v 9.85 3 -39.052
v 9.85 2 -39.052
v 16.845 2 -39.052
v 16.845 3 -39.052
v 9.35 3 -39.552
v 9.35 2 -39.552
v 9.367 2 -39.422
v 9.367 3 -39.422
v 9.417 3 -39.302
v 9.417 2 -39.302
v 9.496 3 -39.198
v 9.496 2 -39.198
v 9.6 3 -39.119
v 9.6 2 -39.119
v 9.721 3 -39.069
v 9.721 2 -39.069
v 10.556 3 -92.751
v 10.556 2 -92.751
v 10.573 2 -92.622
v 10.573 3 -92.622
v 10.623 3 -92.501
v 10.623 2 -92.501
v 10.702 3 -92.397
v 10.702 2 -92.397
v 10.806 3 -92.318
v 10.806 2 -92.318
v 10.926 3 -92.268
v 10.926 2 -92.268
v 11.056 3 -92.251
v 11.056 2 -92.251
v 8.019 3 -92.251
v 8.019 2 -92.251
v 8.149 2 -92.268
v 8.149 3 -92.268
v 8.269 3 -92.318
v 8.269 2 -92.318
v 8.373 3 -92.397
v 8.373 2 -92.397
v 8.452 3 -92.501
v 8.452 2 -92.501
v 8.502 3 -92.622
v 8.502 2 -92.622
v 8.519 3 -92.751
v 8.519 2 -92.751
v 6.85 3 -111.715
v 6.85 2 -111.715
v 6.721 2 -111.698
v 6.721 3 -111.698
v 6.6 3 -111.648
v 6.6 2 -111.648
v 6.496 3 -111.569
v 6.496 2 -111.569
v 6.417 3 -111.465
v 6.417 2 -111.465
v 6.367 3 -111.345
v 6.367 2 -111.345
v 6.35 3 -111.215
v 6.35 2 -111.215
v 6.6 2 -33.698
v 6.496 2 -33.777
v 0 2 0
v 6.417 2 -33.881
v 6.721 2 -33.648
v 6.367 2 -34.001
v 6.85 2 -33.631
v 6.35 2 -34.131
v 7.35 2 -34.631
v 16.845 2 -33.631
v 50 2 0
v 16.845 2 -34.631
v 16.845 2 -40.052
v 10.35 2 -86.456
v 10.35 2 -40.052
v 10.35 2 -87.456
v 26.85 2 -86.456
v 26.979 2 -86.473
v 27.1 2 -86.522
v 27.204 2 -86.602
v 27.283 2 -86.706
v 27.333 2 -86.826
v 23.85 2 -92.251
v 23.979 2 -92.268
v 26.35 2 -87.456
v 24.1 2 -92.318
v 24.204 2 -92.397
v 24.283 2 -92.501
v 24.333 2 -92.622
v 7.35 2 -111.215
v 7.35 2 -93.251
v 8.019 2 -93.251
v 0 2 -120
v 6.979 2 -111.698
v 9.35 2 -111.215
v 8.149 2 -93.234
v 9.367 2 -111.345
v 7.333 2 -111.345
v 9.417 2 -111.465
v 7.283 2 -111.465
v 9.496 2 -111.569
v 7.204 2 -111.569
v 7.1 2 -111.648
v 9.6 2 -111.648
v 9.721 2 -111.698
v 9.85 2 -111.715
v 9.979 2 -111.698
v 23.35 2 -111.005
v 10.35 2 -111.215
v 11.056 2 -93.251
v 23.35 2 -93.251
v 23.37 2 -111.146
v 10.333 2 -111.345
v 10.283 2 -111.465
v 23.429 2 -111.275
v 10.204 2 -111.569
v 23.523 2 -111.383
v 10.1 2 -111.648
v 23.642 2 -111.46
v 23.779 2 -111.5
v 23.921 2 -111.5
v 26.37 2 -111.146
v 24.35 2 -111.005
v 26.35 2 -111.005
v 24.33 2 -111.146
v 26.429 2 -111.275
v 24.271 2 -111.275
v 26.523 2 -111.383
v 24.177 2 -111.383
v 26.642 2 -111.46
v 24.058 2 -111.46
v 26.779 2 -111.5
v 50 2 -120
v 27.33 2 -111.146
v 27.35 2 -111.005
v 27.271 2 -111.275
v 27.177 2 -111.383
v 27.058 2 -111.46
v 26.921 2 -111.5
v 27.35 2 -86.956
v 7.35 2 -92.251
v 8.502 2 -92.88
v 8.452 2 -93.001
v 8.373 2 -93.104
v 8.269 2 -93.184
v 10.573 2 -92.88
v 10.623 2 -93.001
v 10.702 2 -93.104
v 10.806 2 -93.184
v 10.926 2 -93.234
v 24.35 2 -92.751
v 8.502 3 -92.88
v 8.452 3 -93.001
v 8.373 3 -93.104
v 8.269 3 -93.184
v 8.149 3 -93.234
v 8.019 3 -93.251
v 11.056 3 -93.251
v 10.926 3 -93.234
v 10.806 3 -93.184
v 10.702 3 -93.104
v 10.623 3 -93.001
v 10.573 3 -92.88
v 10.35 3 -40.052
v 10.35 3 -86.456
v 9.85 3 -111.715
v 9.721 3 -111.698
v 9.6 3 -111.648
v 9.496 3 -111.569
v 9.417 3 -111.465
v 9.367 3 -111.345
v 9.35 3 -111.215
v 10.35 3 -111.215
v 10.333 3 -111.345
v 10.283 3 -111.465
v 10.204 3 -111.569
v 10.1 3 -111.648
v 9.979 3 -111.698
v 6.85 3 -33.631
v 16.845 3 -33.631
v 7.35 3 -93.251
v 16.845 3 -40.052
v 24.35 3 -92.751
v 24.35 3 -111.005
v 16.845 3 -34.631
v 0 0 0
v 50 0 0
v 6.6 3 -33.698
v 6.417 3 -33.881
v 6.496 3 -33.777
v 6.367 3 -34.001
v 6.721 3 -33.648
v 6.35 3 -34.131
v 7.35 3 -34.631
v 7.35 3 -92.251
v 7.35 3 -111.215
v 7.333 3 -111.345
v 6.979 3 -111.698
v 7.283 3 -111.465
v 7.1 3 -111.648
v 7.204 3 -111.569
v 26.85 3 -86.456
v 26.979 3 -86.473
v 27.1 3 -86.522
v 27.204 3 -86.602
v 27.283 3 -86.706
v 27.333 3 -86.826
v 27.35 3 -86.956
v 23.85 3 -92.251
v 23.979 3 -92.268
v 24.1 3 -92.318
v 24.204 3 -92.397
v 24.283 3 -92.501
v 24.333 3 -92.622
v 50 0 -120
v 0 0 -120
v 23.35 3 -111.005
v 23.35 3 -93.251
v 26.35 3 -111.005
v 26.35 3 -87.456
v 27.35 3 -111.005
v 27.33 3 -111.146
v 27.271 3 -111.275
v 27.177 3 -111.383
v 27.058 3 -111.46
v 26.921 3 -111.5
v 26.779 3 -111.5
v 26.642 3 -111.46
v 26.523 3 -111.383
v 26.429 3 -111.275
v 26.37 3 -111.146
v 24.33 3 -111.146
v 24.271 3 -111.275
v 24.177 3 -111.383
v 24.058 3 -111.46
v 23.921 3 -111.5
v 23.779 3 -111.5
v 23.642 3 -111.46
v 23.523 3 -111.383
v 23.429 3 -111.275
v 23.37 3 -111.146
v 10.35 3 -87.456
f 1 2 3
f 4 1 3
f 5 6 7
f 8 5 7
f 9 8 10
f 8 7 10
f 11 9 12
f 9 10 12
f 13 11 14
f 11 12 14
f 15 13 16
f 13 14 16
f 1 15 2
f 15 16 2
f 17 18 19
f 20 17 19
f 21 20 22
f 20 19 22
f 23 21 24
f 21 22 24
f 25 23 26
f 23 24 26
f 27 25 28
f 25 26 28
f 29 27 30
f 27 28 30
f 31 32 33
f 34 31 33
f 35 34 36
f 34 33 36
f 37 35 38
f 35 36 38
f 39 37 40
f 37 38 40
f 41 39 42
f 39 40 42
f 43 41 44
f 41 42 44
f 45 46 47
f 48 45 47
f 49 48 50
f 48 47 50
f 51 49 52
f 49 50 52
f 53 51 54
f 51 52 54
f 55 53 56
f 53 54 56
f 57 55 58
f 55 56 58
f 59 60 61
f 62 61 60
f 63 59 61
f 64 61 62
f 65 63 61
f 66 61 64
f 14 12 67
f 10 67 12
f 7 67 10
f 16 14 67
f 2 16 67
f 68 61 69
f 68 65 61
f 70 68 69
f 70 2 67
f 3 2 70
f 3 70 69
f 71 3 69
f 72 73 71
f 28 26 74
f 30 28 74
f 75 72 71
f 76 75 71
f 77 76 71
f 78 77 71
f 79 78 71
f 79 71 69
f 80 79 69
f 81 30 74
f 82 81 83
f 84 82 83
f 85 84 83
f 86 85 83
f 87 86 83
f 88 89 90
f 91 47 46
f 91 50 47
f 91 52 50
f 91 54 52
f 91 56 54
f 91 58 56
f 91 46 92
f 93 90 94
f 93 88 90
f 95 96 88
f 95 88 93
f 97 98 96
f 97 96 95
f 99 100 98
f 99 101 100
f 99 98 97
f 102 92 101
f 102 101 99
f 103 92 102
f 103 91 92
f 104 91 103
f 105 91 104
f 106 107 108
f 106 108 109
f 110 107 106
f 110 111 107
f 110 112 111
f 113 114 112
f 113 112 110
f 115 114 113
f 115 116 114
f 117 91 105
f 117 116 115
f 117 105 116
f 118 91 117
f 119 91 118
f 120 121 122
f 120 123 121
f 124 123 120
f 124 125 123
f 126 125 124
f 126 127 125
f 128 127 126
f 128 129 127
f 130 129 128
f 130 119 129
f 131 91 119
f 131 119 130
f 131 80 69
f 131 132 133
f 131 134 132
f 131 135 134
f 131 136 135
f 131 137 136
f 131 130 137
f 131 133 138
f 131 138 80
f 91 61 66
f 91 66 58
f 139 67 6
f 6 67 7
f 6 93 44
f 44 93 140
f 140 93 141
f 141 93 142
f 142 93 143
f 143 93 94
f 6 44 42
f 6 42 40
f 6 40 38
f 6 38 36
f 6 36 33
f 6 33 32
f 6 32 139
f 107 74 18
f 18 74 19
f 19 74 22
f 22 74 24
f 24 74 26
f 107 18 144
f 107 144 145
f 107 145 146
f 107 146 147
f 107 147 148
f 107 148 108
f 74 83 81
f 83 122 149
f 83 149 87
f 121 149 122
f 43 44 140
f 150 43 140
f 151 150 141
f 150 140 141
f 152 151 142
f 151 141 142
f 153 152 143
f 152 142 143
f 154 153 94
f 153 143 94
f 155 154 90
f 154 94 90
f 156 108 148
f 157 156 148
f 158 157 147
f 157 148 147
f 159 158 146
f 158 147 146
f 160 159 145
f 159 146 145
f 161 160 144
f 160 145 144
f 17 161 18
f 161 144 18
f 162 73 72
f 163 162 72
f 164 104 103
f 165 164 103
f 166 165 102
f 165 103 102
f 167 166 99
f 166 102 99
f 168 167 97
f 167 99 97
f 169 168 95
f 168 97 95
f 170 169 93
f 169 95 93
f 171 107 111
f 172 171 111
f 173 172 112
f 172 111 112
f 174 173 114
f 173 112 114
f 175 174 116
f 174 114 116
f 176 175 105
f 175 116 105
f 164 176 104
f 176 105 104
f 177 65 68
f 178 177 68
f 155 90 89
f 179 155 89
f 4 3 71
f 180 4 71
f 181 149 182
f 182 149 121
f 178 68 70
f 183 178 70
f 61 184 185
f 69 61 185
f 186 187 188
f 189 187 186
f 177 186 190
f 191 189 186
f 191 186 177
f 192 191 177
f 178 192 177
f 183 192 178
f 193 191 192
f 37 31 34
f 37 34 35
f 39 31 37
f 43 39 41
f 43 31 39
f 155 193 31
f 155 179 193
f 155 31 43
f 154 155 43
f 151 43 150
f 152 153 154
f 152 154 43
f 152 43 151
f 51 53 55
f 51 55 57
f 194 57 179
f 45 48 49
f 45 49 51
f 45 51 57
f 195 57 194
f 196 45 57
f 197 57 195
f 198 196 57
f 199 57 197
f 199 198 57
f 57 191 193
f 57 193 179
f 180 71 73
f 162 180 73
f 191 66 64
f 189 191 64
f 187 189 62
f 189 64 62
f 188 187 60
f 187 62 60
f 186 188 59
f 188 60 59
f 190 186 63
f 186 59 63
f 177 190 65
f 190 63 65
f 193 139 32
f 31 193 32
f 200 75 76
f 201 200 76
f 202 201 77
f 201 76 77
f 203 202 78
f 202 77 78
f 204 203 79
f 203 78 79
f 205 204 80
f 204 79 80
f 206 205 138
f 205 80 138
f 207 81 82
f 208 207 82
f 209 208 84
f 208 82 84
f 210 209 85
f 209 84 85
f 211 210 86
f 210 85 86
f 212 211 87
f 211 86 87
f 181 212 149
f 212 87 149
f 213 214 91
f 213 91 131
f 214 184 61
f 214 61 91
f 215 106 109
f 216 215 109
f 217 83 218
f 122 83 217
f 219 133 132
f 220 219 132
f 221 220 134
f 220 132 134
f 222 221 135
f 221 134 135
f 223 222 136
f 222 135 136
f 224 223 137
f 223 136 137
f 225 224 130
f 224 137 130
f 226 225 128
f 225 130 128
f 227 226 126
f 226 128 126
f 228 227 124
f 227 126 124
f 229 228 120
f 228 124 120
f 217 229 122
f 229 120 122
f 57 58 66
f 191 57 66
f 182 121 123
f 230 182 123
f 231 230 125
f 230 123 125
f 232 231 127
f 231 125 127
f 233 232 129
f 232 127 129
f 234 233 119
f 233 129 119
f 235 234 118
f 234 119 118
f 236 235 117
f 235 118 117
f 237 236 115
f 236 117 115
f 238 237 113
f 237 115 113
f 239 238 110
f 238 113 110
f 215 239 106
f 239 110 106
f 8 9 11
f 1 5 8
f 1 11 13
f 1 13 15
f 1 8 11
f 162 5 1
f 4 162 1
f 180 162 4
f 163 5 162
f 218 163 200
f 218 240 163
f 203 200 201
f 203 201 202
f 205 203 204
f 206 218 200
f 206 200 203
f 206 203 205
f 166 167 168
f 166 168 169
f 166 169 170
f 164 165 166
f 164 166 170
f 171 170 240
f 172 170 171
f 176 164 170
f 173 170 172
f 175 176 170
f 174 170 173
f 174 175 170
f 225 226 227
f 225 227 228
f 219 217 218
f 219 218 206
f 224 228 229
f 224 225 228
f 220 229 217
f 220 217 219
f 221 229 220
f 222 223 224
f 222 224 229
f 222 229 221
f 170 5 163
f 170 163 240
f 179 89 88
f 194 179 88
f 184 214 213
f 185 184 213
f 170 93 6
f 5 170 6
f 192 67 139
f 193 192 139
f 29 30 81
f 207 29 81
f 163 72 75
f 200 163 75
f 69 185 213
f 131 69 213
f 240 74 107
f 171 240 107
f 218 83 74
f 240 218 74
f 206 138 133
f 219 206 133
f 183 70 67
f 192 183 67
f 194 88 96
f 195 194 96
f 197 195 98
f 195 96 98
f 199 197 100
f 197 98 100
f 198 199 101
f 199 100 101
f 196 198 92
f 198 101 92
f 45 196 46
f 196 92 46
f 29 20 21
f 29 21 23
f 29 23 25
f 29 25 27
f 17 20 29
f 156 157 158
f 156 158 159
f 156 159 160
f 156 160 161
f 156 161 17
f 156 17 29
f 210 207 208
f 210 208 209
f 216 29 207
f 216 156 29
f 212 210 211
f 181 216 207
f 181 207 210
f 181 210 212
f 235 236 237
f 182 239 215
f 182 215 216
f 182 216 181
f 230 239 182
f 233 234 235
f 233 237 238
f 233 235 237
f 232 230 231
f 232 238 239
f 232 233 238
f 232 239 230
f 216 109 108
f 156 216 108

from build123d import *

# Parameters (mm, degrees)
SKETCH1_W           = 50
SKETCH1_H           = 120
BOSS_EXTRUDE1_DEPTH = 2
SKETCH2_W           = 0.5
SKETCH2_H           = 5.295420769
SKETCH2_H_2         = 23.549654675
BOSS_EXTRUDE3_DEPTH = 1


with BuildPart() as part:
    # Sketch1 → Boss-Extrude1 (new body)
    with BuildSketch(Plane(origin=(0, 0, 0), x_dir=(1, 0, 0), z_dir=(0, 1, 0))):
        with Locations((25, 60)):
            Rectangle(SKETCH1_W, SKETCH1_H)
    extrude(amount=BOSS_EXTRUDE1_DEPTH)

    # Sketch2 → Boss-Extrude3 (add)
    with BuildSketch(Plane(origin=(0, 2, 0), x_dir=(1, 0, 0), z_dir=(0, 1, 0))):
        with BuildLine():
            Line((9.849958258, 39.051579924), (16.845127039, 39.051579924))
            Line((16.845127039, 39.051579924), (16.845127039, 40.051579924))
            Line((16.845127039, 40.051579924), (10.349958258, 40.051579924))
            Line((10.349958258, 40.051579924), (10.349958258, 39.551579924))
            ThreePointArc((10.349958258, 39.551579924), (10.203511648, 39.198026534), (9.849958258, 39.051579924))
        make_face()
        with BuildLine():
            Line((10.349958258, 40.051579924), (10.349958258, 86.455511816))
            Line((10.349958258, 86.455511816), (9.849958258, 86.455511816))
            ThreePointArc((9.849958258, 86.455511816), (9.496404867, 86.601958426), (9.349958258, 86.955511816))
            Line((9.349958258, 86.955511816), (9.349958258, 39.551579924))
            ThreePointArc((9.349958258, 39.551579924), (9.496404867, 39.198026534), (9.849958258, 39.051579924))
            ThreePointArc((9.849958258, 39.051579924), (10.203511648, 39.198026534), (10.349958258, 39.551579924))
            Line((10.349958258, 39.551579924), (10.349958258, 40.051579924))
        make_face()
        with BuildLine():
            Line((6.849958258, 33.630782095), (16.845127039, 33.630782095))
            Line((16.845127039, 33.630782095), (16.845127039, 34.630782095))
            Line((16.845127039, 34.630782095), (7.349958258, 34.630782095))
            Line((7.349958258, 34.630782095), (7.349958258, 92.250932585))
            Line((7.349958258, 92.250932585), (8.019263959, 92.250932585))
            ThreePointArc((8.019263959, 92.250932585), (8.37281735, 92.397379194), (8.519263959, 92.750932585))
            ThreePointArc((8.519263959, 92.750932585), (8.37281735, 93.104485976), (8.019263959, 93.250932585))
            Line((8.019263959, 93.250932585), (7.349958258, 93.250932585))
            Line((7.349958258, 93.250932585), (7.349958258, 111.215314398))
            ThreePointArc((7.349958258, 111.215314398), (7.203511648, 111.568867789), (6.849958258, 111.715314398))
            ThreePointArc((6.849958258, 111.715314398), (6.496404867, 111.568867789), (6.349958258, 111.215314398))
            Line((6.349958258, 111.215314398), (6.349958258, 34.130782095))
            ThreePointArc((6.349958258, 34.130782095), (6.496404867, 33.777228705), (6.849958258, 33.630782095))
        make_face()
        with BuildLine():
            Line((9.849958258, 92.750932585), (10.349958258, 92.750932585))
            Line((10.349958258, 92.750932585), (10.349958258, 111.215314398))
            ThreePointArc((10.349958258, 111.215314398), (10.203511648, 111.568867789), (9.849958258, 111.715314398))
            ThreePointArc((9.849958258, 111.715314398), (9.496404867, 111.568867789), (9.349958258, 111.215314398))
            Line((9.349958258, 111.215314398), (9.349958258, 92.750932585))
            Line((9.349958258, 92.750932585), (9.849958258, 92.750932585))
        make_face()
        with Locations((10.099958258, 90.1032222)):
            Rectangle(SKETCH2_W, SKETCH2_H)
        with BuildLine():
            ThreePointArc((9.349958258, 86.955511816), (9.496404867, 87.309065207), (9.849958258, 87.455511816))
            Line((9.849958258, 87.455511816), (9.849958258, 92.750932585))
            Line((9.849958258, 92.750932585), (9.349958258, 92.750932585))
            Line((9.349958258, 92.750932585), (9.349958258, 86.955511816))
        make_face()
        with BuildLine():
            ThreePointArc((11.055620389, 93.250932585), (10.702066998, 93.104485976), (10.555620389, 92.750932585))
            Line((10.555620389, 92.750932585), (23.349958258, 92.750932585))
            Line((23.349958258, 92.750932585), (23.349958258, 93.250932585))
            Line((23.349958258, 93.250932585), (11.055620389, 93.250932585))
        make_face()
        with BuildLine():
            Line((23.349958258, 92.750932585), (10.555620389, 92.750932585))
            ThreePointArc((10.555620389, 92.750932585), (10.702066998, 92.397379194), (11.055620389, 92.250932585))
            Line((11.055620389, 92.250932585), (23.849958258, 92.250932585))
            ThreePointArc((23.849958258, 92.250932585), (23.496404867, 92.397379194), (23.349958258, 92.750932585))
        make_face()
        with BuildLine():
            Line((10.349958258, 86.455511816), (25, 86.455511816))
            Line((25, 86.455511816), (26.849958258, 86.455511816))
            ThreePointArc((26.849958258, 86.455511816), (26.496404867, 86.601958426), (26.349958258, 86.955511816))
            Line((26.349958258, 86.955511816), (26.349958258, 87.455511816))
            Line((26.349958258, 87.455511816), (25, 87.455511816))
            Line((25, 87.455511816), (10.349958258, 87.455511816))
            Line((10.349958258, 87.455511816), (10.349958258, 86.455511816))
        make_face()
        with BuildLine():
            ThreePointArc((26.349958258, 86.955511816), (26.496404867, 86.601958426), (26.849958258, 86.455511816))
            ThreePointArc((26.849958258, 86.455511816), (27.203511648, 86.601958426), (27.349958258, 86.955511816))
            ThreePointArc((27.349958258, 86.955511816), (27.203511648, 87.309065207), (26.849958258, 87.455511816))
            Line((26.849958258, 87.455511816), (26.349958258, 87.455511816))
            Line((26.349958258, 87.455511816), (26.349958258, 86.955511816))
        make_face()
        with BuildLine():
            ThreePointArc((26.849958258, 87.455511816), (27.203511648, 87.309065207), (27.349958258, 86.955511816))
            Line((27.349958258, 86.955511816), (27.349958258, 111.005166491))
            ThreePointArc((27.349958258, 111.005166491), (26.849958258, 111.505166491), (26.349958258, 111.005166491))
            Line((26.349958258, 111.005166491), (26.849958258, 111.005166491))
            Line((26.849958258, 111.005166491), (26.849958258, 87.455511816))
        make_face()
        with Locations((26.599958258, 99.230339154)):
            Rectangle(SKETCH2_W, SKETCH2_H_2)
        with BuildLine():
            Line((23.849958258, 111.005166491), (23.849958258, 93.250932585))
            ThreePointArc((23.849958258, 93.250932585), (24.203511648, 93.104485976), (24.349958258, 92.750932585))
            Line((24.349958258, 92.750932585), (24.349958258, 111.005166491))
            Line((24.349958258, 111.005166491), (23.849958258, 111.005166491))
        make_face()
        with BuildLine():
            Line((23.349958258, 93.250932585), (23.349958258, 92.750932585))
            ThreePointArc((23.349958258, 92.750932585), (23.496404867, 92.397379194), (23.849958258, 92.250932585))
            ThreePointArc((23.849958258, 92.250932585), (24.203511648, 92.397379194), (24.349958258, 92.750932585))
            ThreePointArc((24.349958258, 92.750932585), (24.203511648, 93.104485976), (23.849958258, 93.250932585))
            Line((23.849958258, 93.250932585), (23.349958258, 93.250932585))
        make_face()
        with BuildLine():
            Line((23.349958258, 111.005166491), (23.349958258, 93.250932585))
            Line((23.349958258, 93.250932585), (23.849958258, 93.250932585))
            Line((23.849958258, 93.250932585), (23.849958258, 111.005166491))
            Line((23.849958258, 111.005166491), (24.349958258, 111.005166491))
            ThreePointArc((24.349958258, 111.005166491), (23.849958258, 111.505166491), (23.349958258, 111.005166491))
        make_face()
        with BuildLine():
            Line((9.849958258, 86.455511816), (10.349958258, 86.455511816))
            Line((10.349958258, 86.455511816), (10.349958258, 87.455511816))
            Line((10.349958258, 87.455511816), (9.849958258, 87.455511816))
            ThreePointArc((9.849958258, 87.455511816), (9.496404867, 87.309065207), (9.349958258, 86.955511816))
            ThreePointArc((9.349958258, 86.955511816), (9.496404867, 86.601958426), (9.849958258, 86.455511816))
        make_face()
    extrude(amount=BOSS_EXTRUDE3_DEPTH)


solid = part.part
